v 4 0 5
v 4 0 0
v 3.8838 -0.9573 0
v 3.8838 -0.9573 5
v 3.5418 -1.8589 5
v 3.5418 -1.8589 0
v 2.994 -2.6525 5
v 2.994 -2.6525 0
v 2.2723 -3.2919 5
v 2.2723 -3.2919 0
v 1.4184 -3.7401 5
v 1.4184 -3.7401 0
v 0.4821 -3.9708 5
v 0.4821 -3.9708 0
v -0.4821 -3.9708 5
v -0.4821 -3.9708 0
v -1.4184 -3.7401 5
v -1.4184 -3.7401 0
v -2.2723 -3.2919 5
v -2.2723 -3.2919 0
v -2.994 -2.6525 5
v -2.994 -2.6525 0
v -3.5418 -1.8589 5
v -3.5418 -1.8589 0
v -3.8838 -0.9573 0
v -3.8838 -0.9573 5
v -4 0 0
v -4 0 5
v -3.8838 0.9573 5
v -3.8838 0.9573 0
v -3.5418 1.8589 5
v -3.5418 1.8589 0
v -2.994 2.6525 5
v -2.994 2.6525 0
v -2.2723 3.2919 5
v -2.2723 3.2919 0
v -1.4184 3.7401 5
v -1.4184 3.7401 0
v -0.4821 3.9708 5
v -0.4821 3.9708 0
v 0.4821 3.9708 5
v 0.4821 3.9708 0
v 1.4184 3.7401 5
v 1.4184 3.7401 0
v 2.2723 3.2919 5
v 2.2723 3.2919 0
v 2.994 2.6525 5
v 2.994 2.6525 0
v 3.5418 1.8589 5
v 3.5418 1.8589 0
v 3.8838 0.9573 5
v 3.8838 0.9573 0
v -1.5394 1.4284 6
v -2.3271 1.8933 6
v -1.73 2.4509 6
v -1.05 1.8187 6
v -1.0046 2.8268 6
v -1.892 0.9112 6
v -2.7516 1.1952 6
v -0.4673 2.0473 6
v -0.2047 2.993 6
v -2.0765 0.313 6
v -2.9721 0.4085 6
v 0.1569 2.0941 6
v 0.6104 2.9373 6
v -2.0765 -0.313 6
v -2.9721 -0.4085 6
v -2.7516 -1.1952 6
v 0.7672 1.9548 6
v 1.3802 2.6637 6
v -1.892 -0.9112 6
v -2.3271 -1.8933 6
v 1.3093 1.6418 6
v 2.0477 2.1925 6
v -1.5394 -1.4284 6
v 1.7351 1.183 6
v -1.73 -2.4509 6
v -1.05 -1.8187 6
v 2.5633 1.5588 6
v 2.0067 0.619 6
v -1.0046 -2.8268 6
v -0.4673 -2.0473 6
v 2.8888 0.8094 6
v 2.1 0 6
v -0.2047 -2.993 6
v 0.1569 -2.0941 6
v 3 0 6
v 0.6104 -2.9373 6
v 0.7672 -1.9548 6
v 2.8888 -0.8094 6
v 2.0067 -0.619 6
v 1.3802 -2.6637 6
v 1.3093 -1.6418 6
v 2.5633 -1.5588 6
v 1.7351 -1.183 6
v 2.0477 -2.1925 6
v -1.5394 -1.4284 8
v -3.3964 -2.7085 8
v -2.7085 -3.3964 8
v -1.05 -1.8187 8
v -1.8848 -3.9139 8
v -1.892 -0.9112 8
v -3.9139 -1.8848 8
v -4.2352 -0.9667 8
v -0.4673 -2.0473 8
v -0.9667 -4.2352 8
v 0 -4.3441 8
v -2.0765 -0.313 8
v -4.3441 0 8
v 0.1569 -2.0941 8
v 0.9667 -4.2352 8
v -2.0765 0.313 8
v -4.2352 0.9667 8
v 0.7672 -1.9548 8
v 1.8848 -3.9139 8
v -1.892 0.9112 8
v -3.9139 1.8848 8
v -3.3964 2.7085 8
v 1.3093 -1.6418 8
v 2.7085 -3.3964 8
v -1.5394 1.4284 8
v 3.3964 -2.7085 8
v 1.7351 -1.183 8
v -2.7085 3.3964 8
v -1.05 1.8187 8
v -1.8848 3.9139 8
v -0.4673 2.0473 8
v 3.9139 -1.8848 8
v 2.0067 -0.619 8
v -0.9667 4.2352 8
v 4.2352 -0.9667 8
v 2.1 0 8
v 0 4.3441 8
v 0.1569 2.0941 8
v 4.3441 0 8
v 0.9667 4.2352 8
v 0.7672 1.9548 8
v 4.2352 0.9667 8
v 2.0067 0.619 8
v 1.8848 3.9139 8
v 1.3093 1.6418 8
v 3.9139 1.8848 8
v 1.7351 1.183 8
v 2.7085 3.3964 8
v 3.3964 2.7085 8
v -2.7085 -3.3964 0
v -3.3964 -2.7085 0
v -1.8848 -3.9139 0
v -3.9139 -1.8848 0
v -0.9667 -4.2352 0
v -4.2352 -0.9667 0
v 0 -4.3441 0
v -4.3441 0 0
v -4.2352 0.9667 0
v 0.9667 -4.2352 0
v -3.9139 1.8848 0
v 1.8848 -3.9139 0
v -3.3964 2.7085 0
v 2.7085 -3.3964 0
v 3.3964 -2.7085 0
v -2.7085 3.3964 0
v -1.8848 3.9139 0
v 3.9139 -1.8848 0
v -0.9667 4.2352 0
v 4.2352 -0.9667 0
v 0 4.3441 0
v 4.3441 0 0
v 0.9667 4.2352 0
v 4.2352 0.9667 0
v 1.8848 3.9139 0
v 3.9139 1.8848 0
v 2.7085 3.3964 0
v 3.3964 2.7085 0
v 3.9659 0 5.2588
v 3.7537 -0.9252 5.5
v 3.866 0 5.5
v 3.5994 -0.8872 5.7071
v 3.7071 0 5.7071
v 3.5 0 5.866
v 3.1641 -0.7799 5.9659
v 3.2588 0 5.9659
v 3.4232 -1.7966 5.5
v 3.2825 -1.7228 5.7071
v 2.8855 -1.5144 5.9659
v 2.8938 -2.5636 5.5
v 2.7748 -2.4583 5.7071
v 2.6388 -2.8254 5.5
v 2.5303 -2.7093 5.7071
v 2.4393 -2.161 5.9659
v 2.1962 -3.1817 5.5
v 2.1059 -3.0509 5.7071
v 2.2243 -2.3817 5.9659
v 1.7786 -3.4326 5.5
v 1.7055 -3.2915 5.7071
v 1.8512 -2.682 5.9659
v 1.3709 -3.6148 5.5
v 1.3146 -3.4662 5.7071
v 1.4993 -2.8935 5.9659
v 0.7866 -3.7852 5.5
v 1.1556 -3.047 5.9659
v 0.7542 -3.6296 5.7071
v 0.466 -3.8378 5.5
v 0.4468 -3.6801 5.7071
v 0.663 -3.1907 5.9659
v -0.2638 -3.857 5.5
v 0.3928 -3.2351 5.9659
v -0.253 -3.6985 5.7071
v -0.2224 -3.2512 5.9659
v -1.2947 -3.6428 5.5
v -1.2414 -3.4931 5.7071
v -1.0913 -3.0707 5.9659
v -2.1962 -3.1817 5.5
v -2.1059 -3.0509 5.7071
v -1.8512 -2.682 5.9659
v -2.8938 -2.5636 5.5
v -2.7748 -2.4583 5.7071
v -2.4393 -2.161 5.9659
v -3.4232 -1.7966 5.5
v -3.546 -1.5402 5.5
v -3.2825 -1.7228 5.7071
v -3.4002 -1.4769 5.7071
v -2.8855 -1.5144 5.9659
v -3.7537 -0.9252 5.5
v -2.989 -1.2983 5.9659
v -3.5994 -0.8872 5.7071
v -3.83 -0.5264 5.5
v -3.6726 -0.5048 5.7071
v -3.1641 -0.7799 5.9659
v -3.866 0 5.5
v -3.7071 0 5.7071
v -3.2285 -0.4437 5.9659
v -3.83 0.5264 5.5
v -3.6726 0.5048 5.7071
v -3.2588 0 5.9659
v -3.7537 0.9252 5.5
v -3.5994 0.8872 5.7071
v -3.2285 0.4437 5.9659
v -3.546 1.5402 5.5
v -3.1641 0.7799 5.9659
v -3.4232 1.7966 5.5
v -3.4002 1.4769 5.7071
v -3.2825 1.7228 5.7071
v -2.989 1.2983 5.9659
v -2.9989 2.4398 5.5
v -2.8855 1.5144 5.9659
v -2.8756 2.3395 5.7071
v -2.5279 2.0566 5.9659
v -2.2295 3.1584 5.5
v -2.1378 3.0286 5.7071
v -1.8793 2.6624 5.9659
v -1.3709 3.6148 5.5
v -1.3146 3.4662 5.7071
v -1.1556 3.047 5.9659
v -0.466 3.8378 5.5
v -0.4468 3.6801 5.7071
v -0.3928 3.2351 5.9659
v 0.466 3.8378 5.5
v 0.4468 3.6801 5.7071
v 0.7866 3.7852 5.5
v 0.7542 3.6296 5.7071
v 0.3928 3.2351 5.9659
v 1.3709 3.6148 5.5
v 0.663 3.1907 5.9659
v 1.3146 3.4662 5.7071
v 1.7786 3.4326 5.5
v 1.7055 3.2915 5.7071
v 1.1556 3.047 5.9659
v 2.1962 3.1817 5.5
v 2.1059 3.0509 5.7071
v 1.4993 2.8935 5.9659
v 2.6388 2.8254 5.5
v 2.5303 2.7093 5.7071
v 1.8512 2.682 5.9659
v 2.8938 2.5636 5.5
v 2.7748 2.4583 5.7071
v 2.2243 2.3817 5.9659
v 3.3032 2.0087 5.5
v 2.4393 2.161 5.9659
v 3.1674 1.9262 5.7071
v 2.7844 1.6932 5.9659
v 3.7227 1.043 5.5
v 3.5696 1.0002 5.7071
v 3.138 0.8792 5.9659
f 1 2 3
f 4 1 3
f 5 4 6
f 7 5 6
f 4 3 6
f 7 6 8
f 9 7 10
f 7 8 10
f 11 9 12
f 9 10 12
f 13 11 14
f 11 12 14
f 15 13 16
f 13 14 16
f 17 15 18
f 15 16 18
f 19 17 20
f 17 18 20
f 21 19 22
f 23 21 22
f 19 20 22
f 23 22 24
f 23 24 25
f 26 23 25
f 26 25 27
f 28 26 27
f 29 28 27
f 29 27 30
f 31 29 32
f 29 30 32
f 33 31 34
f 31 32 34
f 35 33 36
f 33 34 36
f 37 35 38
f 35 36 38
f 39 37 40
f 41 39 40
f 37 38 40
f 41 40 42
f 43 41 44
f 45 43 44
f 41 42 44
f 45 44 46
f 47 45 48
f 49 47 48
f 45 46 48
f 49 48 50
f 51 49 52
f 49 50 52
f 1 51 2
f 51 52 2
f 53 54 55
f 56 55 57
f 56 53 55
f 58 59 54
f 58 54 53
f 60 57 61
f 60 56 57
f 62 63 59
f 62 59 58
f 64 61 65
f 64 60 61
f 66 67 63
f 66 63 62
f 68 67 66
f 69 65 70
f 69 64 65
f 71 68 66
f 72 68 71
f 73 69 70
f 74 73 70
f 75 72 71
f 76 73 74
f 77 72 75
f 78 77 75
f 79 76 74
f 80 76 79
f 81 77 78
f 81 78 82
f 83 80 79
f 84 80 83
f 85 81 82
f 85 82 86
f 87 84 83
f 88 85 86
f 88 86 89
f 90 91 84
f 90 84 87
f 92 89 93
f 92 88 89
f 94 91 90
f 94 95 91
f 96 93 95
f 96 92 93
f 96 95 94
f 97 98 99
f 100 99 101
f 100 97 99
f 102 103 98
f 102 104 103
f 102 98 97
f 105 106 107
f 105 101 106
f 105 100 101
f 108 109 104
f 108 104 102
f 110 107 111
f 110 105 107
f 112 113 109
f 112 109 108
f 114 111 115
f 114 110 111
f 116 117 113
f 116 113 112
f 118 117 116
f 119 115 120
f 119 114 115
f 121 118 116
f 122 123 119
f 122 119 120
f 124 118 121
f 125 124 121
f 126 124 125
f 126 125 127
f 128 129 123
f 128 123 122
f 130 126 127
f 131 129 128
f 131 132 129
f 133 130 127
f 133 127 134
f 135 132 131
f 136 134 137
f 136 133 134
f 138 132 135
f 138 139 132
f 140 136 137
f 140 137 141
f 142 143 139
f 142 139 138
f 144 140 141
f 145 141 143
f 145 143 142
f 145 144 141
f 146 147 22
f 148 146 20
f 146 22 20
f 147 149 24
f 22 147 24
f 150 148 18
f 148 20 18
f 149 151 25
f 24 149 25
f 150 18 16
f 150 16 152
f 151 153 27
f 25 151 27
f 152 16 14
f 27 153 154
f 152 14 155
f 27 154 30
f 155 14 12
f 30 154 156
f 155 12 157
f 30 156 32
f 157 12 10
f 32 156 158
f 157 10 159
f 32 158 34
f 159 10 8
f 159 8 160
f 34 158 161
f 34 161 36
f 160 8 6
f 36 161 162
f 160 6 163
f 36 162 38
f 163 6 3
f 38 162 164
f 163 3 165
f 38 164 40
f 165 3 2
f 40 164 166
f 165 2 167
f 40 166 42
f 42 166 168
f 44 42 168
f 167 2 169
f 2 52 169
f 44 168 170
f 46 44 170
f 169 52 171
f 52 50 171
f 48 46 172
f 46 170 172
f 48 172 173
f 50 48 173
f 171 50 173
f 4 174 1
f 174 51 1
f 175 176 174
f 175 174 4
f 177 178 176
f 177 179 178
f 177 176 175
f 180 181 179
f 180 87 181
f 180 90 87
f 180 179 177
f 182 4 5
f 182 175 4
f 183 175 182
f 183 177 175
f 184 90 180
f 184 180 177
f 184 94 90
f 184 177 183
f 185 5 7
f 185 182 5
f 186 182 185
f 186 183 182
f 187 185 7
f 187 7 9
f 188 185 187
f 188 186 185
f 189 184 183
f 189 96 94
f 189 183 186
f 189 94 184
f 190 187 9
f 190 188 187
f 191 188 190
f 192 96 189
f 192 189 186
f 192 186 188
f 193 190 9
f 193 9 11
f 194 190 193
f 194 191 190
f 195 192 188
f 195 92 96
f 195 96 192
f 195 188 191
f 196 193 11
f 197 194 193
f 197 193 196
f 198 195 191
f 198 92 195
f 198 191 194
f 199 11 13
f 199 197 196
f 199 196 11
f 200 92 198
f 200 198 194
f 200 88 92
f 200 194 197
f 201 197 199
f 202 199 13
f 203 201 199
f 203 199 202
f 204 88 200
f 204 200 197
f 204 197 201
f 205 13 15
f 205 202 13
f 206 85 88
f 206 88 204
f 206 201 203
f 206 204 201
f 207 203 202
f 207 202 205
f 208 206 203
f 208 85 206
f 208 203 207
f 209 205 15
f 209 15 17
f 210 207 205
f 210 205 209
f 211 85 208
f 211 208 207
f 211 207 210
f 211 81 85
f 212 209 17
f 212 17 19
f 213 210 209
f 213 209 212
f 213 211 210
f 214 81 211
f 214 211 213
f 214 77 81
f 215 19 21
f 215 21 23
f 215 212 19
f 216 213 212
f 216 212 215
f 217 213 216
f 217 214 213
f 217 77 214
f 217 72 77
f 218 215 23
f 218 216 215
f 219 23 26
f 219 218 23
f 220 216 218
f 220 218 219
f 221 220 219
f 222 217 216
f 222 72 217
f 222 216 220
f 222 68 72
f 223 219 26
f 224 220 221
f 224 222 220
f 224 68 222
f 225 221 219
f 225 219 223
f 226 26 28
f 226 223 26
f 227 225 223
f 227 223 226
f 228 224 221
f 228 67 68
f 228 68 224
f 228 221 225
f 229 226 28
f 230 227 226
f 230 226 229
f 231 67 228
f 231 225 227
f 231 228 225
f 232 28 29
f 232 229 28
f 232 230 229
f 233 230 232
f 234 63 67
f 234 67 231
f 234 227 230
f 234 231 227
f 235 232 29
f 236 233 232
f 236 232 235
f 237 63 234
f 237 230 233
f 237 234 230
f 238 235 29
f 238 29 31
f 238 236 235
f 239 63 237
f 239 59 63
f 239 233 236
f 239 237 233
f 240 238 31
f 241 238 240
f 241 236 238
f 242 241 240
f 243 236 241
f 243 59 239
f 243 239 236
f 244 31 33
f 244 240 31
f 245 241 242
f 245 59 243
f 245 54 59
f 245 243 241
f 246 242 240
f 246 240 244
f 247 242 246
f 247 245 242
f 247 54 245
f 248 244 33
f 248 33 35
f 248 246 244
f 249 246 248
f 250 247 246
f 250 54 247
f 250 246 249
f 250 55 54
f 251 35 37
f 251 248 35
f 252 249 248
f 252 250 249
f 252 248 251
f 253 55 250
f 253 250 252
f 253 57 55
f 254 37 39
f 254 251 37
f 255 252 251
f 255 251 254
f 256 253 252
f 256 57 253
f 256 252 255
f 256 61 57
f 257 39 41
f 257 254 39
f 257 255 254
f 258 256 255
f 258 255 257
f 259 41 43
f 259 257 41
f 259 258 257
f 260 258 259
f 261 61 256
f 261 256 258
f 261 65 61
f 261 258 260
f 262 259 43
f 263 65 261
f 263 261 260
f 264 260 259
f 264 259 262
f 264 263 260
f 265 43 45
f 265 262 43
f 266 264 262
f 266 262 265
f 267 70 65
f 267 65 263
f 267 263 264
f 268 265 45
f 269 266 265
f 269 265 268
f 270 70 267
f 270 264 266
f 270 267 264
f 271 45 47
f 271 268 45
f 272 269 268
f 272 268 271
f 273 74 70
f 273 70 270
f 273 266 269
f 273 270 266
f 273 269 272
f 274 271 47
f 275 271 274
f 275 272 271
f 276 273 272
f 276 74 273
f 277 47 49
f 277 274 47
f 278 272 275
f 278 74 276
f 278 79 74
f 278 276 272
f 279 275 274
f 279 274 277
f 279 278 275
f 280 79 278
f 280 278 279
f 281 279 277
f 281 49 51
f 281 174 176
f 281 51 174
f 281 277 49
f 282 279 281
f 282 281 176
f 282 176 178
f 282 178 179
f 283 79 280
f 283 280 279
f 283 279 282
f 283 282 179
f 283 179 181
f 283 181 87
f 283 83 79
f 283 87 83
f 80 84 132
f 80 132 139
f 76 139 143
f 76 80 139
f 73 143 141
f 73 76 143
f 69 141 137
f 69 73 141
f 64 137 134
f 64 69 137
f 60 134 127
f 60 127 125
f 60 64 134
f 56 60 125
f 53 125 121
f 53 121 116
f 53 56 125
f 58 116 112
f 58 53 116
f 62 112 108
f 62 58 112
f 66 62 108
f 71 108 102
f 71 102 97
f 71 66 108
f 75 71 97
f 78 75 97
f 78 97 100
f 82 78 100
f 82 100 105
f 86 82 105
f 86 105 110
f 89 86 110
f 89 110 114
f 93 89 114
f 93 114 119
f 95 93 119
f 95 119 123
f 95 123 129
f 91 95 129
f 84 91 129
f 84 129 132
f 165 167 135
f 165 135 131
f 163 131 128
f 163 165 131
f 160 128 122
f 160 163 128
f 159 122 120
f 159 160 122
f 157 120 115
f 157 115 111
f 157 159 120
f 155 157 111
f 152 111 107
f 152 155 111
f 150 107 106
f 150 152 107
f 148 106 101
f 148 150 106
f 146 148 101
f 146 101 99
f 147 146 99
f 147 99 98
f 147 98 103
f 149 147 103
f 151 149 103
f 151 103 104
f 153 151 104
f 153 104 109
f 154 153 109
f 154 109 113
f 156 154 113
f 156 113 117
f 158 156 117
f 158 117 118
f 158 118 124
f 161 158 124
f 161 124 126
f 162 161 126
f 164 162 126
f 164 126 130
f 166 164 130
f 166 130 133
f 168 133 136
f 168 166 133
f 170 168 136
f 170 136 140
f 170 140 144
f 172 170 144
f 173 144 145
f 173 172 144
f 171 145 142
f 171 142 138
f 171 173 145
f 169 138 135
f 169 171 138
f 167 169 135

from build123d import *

# Parameters (mm, degrees)
F0_W     = 9
F0_H     = 9
F0_R     = 3.5
F0_R_2   = 2.1
F1_DEPTH = 8
F2_R     = 4
F2_R_2   = 2.1
F3_DEPTH = 6
F4_R     = 1
F5_R     = 6.9957101535
F5_R_2   = 4.3441334804
F6_DEPTH = 25


with BuildPart() as f1:
    # F0 (on Top) → F1 (new body)
    with BuildSketch(Plane.XY):
        Rectangle(F0_W, F0_H)
        Circle(F0_R, mode=Mode.SUBTRACT)
        Circle(F0_R)
        Circle(F0_R_2, mode=Mode.SUBTRACT)
    extrude(amount=F1_DEPTH)

    # F2 (on face) → F3 (cut)
    with BuildSketch(Plane(origin=(0, 0, 0), x_dir=(1, 0, 0), z_dir=(0, 0, -1))):
        Circle(F2_R)
        Circle(F2_R_2, mode=Mode.SUBTRACT)
    extrude(amount=-F3_DEPTH, mode=Mode.SUBTRACT)

    # F4
    f4_edges = [f1.edges().sort_by_distance(p)[0] for p in [
        (-4, 0, 6),
    ]]
    fillet(f4_edges, radius=F4_R)

    # F5 (on face) → F6 (cut)
    with BuildSketch(Plane(origin=(0, 0, 0), x_dir=(1, 0, 0), z_dir=(0, 0, -1))):
        Circle(F5_R)
        Circle(F5_R_2, mode=Mode.SUBTRACT)
    extrude(amount=-F6_DEPTH, mode=Mode.SUBTRACT)


solid = f1.part
